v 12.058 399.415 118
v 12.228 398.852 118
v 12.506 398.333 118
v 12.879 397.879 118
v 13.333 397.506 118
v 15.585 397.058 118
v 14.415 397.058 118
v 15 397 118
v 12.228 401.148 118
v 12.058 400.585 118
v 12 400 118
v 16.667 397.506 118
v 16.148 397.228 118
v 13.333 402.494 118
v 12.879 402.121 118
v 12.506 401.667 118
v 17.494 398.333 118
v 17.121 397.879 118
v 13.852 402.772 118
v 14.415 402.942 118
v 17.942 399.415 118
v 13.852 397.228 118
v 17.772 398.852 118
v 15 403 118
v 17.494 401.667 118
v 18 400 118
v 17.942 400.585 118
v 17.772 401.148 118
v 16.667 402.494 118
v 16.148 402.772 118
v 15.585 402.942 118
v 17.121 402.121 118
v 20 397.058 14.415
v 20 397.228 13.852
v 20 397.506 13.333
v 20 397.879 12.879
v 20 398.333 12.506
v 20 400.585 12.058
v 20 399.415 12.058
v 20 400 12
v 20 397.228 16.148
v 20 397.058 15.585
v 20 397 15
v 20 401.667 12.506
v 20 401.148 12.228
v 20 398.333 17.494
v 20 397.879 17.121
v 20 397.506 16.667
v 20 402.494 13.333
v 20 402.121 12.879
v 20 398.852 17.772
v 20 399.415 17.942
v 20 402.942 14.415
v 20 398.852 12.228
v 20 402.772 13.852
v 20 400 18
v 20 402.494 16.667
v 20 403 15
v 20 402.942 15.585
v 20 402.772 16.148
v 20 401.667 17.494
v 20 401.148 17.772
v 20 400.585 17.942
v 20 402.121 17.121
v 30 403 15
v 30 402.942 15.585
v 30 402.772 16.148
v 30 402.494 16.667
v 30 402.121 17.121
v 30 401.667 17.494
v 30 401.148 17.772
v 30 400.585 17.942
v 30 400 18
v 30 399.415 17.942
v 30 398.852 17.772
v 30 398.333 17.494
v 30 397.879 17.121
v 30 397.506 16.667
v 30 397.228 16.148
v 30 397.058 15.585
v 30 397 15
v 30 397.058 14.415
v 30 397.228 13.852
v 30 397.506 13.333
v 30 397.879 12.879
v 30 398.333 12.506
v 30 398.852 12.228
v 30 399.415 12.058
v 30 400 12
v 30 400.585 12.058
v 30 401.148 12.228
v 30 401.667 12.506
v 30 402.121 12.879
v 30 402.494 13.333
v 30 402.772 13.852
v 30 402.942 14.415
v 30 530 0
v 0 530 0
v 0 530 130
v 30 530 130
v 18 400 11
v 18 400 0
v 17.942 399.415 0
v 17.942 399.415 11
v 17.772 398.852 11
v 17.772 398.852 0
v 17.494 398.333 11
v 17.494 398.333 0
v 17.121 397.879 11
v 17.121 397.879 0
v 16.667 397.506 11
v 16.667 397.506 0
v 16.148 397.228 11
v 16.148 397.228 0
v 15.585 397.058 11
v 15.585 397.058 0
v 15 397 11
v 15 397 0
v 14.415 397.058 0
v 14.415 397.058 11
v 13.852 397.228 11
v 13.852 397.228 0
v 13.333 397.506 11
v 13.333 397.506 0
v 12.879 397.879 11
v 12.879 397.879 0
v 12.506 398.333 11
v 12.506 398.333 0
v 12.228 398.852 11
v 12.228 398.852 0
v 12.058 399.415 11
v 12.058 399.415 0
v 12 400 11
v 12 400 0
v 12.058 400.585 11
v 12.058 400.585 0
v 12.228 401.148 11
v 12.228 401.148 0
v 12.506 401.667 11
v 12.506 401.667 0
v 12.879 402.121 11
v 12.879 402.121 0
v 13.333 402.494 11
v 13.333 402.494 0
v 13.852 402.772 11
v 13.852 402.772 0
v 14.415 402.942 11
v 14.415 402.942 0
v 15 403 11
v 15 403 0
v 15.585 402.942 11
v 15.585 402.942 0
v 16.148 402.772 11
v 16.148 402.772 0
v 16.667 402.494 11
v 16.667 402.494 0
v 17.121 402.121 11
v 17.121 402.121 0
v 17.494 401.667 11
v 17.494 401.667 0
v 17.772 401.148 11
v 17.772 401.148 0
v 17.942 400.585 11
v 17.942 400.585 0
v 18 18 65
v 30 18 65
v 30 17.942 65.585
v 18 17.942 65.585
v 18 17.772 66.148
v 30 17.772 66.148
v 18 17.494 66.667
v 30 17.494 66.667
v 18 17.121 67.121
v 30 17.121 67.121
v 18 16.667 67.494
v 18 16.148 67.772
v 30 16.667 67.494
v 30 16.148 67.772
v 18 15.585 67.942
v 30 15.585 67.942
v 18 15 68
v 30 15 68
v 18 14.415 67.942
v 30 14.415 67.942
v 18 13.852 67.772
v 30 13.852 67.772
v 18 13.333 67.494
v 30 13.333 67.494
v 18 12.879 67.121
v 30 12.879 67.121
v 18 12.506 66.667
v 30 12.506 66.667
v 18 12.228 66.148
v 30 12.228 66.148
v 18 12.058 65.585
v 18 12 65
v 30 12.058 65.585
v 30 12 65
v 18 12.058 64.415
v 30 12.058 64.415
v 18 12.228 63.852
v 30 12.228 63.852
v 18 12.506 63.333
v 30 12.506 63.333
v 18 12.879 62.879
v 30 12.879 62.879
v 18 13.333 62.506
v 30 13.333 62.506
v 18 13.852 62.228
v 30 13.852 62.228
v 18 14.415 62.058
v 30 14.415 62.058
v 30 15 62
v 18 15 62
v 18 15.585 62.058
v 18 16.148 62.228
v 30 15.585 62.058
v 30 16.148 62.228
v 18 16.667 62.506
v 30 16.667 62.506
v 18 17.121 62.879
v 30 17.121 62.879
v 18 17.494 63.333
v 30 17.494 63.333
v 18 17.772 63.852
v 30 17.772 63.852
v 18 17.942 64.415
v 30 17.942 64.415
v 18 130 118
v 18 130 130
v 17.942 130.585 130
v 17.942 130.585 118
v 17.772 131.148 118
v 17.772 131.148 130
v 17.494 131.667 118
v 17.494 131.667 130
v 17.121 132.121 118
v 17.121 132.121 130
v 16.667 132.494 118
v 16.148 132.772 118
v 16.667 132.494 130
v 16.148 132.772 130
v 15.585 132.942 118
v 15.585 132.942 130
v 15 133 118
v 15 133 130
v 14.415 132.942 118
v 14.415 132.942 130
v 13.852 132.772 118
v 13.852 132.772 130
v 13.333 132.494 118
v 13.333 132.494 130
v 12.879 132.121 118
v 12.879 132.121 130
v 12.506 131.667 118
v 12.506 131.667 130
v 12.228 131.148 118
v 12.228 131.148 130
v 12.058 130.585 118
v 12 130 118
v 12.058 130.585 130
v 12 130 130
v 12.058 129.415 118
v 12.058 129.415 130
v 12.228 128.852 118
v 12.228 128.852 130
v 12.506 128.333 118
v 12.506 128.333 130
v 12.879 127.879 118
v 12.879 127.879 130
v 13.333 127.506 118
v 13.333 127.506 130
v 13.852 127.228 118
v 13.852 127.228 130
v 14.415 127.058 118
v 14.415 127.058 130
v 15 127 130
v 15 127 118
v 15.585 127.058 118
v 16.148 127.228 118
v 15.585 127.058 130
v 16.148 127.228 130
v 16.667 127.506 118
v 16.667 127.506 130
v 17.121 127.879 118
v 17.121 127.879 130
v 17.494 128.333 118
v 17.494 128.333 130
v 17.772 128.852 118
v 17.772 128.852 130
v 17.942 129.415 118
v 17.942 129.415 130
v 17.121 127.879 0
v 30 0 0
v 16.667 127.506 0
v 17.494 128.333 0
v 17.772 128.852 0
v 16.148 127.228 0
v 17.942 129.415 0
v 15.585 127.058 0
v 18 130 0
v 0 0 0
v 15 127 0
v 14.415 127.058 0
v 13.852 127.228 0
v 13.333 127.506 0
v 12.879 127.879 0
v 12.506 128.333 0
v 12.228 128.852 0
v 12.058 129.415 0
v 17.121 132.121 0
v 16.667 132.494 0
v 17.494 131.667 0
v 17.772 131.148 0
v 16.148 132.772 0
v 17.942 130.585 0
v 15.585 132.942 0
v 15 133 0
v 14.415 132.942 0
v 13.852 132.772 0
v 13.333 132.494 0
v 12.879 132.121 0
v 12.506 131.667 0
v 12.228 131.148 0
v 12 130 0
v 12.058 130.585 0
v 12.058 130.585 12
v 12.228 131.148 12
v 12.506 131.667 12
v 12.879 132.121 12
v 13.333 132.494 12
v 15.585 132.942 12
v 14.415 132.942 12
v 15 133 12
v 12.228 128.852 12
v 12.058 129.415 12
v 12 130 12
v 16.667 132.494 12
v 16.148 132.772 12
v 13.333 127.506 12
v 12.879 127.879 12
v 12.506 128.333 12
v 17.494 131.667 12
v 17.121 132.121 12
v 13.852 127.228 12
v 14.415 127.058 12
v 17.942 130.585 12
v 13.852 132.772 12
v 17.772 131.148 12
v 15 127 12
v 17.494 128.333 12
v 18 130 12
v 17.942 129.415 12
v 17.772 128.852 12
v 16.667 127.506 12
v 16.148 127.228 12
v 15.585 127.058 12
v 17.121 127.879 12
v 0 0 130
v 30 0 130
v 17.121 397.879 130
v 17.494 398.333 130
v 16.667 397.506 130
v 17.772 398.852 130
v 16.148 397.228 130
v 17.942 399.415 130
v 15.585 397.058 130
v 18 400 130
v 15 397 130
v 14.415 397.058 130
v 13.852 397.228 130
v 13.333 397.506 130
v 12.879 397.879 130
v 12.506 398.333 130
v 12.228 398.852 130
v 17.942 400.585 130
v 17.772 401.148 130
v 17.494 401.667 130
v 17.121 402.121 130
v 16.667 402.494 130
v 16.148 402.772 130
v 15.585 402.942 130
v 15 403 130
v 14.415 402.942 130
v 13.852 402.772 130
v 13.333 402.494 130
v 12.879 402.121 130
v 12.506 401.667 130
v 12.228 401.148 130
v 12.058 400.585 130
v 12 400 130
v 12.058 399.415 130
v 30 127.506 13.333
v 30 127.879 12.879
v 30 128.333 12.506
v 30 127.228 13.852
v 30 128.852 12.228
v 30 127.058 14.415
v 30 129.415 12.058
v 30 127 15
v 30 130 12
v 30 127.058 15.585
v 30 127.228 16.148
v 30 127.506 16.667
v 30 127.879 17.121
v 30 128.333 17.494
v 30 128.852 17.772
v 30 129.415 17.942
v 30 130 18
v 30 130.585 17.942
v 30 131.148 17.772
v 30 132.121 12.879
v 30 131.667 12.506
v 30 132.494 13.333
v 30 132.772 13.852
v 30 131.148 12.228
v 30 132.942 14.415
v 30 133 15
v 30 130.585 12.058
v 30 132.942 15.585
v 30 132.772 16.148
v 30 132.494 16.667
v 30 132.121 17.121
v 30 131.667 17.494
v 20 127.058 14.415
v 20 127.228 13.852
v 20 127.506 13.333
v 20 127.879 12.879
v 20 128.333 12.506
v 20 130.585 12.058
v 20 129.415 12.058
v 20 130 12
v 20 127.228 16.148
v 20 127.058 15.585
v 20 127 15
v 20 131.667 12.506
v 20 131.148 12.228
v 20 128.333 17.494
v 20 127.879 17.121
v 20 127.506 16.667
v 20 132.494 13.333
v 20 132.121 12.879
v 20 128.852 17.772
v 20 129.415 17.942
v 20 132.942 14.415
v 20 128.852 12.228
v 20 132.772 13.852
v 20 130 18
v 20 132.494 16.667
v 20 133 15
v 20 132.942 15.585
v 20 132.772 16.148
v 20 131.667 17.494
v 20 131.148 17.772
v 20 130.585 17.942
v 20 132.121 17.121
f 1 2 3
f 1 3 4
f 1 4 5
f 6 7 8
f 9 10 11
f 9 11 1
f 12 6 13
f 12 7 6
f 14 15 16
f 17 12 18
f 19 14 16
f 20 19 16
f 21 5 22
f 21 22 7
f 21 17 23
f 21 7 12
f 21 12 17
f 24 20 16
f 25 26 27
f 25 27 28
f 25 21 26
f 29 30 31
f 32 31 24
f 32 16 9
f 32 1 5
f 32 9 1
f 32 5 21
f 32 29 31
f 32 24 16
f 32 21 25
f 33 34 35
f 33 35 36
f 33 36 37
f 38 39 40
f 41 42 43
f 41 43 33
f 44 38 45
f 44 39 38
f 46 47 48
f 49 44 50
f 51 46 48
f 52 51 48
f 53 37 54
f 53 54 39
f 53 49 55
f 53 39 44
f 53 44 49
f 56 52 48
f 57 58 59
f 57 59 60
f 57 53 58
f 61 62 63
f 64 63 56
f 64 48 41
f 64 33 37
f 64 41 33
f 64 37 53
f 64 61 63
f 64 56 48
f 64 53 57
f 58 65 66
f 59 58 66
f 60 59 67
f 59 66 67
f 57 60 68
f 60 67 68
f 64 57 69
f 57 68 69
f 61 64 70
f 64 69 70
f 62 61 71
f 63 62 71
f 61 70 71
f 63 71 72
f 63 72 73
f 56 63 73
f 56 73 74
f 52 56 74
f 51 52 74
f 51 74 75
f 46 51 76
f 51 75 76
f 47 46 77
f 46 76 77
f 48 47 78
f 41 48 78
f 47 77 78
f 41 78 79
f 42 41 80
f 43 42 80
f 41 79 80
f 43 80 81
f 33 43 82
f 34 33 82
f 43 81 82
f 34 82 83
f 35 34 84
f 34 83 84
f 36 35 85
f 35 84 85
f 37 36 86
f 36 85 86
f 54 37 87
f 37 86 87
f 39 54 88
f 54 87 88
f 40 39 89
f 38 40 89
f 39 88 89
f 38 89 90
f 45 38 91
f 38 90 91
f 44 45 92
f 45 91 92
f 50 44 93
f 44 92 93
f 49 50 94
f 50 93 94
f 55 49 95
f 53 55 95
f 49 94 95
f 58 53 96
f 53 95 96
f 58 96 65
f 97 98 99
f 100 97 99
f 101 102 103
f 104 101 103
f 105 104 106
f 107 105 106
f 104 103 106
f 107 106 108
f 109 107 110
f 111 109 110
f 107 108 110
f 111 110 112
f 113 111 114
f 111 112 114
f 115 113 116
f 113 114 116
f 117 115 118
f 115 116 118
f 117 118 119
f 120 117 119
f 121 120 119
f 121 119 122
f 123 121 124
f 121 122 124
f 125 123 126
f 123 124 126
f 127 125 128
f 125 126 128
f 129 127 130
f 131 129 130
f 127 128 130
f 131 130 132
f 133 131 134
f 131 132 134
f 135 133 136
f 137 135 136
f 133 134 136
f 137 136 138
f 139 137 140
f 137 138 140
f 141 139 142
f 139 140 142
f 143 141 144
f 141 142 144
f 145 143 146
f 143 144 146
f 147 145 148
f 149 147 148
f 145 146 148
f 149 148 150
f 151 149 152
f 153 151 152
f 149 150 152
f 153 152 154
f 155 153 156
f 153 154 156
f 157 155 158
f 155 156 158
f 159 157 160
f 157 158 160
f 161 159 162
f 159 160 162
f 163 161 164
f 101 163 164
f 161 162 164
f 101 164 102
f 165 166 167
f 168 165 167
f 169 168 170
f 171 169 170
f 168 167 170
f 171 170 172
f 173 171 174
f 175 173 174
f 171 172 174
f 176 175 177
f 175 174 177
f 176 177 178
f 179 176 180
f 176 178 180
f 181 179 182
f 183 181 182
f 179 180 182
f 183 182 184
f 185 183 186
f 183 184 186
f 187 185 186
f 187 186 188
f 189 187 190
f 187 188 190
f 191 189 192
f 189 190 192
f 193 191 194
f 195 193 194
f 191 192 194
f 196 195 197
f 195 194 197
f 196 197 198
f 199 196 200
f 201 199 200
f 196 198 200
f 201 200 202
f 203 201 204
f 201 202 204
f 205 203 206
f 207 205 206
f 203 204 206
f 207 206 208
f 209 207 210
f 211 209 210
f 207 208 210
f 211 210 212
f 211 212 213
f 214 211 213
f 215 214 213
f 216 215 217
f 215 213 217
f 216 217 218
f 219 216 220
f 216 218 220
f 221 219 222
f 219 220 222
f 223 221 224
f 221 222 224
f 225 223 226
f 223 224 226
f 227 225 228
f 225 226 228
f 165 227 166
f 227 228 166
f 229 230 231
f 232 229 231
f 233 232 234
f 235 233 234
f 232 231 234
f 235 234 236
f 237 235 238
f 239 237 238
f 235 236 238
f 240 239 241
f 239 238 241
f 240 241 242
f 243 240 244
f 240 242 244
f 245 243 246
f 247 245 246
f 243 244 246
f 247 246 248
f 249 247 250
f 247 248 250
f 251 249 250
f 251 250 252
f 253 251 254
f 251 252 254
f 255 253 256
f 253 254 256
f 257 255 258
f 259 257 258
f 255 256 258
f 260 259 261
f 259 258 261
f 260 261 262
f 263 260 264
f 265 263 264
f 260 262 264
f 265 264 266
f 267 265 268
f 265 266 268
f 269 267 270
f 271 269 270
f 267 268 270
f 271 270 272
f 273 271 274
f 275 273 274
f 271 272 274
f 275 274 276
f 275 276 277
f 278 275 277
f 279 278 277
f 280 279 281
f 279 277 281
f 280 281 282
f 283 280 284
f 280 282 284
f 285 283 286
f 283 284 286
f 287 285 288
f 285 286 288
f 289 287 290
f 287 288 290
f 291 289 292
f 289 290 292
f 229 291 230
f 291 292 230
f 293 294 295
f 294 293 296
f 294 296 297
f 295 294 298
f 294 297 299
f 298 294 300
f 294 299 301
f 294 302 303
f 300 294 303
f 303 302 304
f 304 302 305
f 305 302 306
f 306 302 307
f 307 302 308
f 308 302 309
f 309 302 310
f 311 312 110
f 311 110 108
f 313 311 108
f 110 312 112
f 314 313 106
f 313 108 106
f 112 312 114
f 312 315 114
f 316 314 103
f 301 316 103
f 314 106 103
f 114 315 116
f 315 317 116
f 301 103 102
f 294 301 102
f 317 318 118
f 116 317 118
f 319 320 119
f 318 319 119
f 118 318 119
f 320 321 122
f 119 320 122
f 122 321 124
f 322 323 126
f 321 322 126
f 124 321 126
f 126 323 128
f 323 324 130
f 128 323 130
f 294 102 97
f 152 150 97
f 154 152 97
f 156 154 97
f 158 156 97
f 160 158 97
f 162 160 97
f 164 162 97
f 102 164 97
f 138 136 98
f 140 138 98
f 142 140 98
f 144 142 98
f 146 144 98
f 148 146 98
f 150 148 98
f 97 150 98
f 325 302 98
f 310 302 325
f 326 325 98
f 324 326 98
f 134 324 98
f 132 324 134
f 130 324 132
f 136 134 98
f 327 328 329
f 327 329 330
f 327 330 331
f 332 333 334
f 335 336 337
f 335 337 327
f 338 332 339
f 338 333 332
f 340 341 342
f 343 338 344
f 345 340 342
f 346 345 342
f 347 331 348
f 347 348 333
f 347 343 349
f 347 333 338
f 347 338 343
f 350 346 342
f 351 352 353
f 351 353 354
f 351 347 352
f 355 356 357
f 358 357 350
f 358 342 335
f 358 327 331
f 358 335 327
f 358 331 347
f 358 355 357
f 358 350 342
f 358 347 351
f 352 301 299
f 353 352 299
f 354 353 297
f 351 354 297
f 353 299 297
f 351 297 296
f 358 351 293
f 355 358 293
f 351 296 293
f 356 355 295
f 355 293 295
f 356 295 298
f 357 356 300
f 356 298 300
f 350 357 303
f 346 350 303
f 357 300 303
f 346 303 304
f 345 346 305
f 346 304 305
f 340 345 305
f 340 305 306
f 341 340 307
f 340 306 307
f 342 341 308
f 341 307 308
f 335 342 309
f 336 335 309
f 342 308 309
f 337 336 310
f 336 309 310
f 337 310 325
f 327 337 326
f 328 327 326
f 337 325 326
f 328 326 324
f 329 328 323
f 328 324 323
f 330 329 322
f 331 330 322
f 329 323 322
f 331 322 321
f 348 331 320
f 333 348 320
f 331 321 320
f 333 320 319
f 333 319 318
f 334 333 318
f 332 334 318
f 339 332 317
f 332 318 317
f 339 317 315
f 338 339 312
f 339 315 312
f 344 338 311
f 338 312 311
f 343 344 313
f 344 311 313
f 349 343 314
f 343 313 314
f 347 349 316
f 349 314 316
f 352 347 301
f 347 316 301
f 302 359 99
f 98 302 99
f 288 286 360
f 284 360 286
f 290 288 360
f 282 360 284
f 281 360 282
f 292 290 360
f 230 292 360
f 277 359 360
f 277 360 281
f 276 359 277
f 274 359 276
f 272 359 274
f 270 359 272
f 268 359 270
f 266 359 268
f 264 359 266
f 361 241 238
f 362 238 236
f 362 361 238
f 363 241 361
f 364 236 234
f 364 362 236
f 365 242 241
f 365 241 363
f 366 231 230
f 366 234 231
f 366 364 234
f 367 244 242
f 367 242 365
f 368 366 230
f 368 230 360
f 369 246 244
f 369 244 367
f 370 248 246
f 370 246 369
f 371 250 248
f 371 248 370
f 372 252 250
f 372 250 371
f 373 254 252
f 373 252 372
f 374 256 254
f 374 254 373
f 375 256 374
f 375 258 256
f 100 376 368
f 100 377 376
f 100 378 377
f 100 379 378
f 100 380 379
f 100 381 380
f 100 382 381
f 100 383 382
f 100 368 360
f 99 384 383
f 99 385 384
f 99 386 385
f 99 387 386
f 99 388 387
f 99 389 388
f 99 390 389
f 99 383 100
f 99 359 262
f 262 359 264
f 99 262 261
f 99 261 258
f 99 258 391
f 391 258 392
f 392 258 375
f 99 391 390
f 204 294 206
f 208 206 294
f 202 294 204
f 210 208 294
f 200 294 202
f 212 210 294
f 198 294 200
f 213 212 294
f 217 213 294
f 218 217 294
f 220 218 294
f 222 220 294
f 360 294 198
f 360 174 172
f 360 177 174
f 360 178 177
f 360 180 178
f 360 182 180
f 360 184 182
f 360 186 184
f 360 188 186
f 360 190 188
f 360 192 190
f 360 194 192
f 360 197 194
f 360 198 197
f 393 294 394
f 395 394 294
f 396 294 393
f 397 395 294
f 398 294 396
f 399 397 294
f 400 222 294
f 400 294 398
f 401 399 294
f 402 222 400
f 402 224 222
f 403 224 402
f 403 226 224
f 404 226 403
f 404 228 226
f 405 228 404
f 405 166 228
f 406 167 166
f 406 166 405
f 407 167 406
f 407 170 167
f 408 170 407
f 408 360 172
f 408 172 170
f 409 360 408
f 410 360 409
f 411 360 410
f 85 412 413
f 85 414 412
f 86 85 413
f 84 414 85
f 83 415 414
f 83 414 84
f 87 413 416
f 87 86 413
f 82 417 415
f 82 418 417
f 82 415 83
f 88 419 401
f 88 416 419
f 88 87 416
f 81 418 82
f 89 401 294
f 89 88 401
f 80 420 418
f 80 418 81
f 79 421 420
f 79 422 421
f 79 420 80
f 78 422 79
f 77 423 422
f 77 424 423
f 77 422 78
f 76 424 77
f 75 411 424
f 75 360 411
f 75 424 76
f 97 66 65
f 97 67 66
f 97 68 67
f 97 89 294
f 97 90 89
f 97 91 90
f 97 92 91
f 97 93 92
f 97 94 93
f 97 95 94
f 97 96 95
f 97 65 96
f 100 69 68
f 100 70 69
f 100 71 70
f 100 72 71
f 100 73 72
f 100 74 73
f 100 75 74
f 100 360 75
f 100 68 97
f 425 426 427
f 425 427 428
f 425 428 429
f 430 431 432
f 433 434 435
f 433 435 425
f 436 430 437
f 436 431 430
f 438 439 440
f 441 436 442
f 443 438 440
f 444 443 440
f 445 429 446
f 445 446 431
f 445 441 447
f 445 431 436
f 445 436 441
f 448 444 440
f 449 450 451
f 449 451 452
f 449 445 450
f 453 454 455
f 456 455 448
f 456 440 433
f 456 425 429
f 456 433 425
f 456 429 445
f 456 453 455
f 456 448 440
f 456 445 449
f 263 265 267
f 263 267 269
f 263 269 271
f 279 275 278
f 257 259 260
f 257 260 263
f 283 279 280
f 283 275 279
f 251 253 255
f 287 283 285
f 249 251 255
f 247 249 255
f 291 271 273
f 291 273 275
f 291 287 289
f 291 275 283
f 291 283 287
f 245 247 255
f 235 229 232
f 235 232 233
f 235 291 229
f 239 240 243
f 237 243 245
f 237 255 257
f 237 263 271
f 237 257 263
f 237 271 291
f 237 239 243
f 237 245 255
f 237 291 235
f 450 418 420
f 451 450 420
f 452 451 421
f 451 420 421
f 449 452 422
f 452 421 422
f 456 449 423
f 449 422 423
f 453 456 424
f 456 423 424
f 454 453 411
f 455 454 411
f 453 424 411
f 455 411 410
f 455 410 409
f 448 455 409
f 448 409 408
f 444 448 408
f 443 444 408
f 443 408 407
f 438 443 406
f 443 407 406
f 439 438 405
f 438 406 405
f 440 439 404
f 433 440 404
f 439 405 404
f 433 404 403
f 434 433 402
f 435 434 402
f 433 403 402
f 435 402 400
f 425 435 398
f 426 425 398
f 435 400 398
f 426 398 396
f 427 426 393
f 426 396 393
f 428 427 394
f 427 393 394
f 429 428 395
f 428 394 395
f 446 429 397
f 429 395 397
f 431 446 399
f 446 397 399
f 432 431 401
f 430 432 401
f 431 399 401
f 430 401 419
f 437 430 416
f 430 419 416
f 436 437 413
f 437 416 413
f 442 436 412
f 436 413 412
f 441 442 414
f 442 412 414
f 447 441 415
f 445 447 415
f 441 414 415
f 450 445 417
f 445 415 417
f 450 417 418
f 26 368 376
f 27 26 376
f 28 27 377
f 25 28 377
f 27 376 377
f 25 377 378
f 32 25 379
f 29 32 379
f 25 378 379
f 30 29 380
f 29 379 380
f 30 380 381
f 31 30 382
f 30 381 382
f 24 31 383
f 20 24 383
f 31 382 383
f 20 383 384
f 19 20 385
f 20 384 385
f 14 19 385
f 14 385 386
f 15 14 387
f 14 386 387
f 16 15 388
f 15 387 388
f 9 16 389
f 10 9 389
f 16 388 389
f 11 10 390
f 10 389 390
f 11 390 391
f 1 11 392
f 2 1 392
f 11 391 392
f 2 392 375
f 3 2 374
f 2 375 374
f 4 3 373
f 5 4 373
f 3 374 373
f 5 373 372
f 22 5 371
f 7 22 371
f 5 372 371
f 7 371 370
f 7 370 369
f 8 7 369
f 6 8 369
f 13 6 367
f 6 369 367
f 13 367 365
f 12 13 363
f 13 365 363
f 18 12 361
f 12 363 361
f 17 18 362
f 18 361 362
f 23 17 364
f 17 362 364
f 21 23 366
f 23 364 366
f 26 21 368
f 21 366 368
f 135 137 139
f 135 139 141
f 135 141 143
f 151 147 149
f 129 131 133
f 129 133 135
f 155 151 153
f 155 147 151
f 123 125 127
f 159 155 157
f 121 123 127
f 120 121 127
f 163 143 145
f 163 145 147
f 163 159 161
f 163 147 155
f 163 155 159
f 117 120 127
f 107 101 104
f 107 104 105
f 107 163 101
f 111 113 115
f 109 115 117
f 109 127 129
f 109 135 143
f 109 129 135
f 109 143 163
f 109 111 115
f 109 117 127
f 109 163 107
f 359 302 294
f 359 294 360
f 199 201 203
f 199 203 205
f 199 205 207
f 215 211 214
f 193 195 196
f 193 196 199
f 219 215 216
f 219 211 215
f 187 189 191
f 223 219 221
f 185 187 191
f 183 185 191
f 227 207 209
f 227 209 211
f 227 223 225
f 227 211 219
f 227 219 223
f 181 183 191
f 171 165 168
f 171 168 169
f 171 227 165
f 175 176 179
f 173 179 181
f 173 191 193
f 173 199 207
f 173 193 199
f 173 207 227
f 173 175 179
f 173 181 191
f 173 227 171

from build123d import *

# Parameters (mm, degrees)
F0_W      = 530
F0_H      = 130
F1_DEPTH  = 30
F2_R      = 3
F3_DEPTH  = 12
F4_R      = 3
F5_DEPTH  = 11
F6_R      = 3
F7_DEPTH  = 12
F8_R      = 3
F9_DEPTH  = 10
F10_R     = 3
F11_DEPTH = 12


with BuildPart() as f1:
    # F0 (on Right) → F1 (new body)
    with BuildSketch(Plane.YZ):
        with Locations((265, 65)):
            Rectangle(F0_W, F0_H)
    extrude(amount=F1_DEPTH)

    # F2 (on face) → F3 (cut)
    with BuildSketch(Plane(origin=(0, 0, 0), x_dir=(1, 0, 0), z_dir=(0, 0, -1))):
        with Locations((15, -130)):
            Circle(F2_R)
    extrude(amount=-F3_DEPTH, mode=Mode.SUBTRACT)

    # F4 (on face) → F5 (cut)
    with BuildSketch(Plane(origin=(0, 0, 0), x_dir=(1, 0, 0), z_dir=(0, 0, -1))):
        with Locations((15, -400)):
            Circle(F4_R)
    extrude(amount=-F5_DEPTH, mode=Mode.SUBTRACT)

    # F6 (on face) → F7 (cut)
    with BuildSketch(Plane.XY.offset(130)):
        with Locations((15, 130)):
            Circle(F6_R)
        with Locations((15, 400)):
            Circle(F6_R)
    extrude(amount=-F7_DEPTH, mode=Mode.SUBTRACT)

    # F8 (on face) → F9 (cut)
    with BuildSketch(Plane.YZ.offset(30)):
        with Locations((400, 15)):
            Circle(F8_R)
        with Locations((130, 15)):
            Circle(F8_R)
    extrude(amount=-F9_DEPTH, mode=Mode.SUBTRACT)

    # F10 (on face) → F11 (cut)
    with BuildSketch(Plane.YZ.offset(30)):
        with Locations((15, 65)):
            Circle(F10_R)
    extrude(amount=-F11_DEPTH, mode=Mode.SUBTRACT)


solid = f1.part
